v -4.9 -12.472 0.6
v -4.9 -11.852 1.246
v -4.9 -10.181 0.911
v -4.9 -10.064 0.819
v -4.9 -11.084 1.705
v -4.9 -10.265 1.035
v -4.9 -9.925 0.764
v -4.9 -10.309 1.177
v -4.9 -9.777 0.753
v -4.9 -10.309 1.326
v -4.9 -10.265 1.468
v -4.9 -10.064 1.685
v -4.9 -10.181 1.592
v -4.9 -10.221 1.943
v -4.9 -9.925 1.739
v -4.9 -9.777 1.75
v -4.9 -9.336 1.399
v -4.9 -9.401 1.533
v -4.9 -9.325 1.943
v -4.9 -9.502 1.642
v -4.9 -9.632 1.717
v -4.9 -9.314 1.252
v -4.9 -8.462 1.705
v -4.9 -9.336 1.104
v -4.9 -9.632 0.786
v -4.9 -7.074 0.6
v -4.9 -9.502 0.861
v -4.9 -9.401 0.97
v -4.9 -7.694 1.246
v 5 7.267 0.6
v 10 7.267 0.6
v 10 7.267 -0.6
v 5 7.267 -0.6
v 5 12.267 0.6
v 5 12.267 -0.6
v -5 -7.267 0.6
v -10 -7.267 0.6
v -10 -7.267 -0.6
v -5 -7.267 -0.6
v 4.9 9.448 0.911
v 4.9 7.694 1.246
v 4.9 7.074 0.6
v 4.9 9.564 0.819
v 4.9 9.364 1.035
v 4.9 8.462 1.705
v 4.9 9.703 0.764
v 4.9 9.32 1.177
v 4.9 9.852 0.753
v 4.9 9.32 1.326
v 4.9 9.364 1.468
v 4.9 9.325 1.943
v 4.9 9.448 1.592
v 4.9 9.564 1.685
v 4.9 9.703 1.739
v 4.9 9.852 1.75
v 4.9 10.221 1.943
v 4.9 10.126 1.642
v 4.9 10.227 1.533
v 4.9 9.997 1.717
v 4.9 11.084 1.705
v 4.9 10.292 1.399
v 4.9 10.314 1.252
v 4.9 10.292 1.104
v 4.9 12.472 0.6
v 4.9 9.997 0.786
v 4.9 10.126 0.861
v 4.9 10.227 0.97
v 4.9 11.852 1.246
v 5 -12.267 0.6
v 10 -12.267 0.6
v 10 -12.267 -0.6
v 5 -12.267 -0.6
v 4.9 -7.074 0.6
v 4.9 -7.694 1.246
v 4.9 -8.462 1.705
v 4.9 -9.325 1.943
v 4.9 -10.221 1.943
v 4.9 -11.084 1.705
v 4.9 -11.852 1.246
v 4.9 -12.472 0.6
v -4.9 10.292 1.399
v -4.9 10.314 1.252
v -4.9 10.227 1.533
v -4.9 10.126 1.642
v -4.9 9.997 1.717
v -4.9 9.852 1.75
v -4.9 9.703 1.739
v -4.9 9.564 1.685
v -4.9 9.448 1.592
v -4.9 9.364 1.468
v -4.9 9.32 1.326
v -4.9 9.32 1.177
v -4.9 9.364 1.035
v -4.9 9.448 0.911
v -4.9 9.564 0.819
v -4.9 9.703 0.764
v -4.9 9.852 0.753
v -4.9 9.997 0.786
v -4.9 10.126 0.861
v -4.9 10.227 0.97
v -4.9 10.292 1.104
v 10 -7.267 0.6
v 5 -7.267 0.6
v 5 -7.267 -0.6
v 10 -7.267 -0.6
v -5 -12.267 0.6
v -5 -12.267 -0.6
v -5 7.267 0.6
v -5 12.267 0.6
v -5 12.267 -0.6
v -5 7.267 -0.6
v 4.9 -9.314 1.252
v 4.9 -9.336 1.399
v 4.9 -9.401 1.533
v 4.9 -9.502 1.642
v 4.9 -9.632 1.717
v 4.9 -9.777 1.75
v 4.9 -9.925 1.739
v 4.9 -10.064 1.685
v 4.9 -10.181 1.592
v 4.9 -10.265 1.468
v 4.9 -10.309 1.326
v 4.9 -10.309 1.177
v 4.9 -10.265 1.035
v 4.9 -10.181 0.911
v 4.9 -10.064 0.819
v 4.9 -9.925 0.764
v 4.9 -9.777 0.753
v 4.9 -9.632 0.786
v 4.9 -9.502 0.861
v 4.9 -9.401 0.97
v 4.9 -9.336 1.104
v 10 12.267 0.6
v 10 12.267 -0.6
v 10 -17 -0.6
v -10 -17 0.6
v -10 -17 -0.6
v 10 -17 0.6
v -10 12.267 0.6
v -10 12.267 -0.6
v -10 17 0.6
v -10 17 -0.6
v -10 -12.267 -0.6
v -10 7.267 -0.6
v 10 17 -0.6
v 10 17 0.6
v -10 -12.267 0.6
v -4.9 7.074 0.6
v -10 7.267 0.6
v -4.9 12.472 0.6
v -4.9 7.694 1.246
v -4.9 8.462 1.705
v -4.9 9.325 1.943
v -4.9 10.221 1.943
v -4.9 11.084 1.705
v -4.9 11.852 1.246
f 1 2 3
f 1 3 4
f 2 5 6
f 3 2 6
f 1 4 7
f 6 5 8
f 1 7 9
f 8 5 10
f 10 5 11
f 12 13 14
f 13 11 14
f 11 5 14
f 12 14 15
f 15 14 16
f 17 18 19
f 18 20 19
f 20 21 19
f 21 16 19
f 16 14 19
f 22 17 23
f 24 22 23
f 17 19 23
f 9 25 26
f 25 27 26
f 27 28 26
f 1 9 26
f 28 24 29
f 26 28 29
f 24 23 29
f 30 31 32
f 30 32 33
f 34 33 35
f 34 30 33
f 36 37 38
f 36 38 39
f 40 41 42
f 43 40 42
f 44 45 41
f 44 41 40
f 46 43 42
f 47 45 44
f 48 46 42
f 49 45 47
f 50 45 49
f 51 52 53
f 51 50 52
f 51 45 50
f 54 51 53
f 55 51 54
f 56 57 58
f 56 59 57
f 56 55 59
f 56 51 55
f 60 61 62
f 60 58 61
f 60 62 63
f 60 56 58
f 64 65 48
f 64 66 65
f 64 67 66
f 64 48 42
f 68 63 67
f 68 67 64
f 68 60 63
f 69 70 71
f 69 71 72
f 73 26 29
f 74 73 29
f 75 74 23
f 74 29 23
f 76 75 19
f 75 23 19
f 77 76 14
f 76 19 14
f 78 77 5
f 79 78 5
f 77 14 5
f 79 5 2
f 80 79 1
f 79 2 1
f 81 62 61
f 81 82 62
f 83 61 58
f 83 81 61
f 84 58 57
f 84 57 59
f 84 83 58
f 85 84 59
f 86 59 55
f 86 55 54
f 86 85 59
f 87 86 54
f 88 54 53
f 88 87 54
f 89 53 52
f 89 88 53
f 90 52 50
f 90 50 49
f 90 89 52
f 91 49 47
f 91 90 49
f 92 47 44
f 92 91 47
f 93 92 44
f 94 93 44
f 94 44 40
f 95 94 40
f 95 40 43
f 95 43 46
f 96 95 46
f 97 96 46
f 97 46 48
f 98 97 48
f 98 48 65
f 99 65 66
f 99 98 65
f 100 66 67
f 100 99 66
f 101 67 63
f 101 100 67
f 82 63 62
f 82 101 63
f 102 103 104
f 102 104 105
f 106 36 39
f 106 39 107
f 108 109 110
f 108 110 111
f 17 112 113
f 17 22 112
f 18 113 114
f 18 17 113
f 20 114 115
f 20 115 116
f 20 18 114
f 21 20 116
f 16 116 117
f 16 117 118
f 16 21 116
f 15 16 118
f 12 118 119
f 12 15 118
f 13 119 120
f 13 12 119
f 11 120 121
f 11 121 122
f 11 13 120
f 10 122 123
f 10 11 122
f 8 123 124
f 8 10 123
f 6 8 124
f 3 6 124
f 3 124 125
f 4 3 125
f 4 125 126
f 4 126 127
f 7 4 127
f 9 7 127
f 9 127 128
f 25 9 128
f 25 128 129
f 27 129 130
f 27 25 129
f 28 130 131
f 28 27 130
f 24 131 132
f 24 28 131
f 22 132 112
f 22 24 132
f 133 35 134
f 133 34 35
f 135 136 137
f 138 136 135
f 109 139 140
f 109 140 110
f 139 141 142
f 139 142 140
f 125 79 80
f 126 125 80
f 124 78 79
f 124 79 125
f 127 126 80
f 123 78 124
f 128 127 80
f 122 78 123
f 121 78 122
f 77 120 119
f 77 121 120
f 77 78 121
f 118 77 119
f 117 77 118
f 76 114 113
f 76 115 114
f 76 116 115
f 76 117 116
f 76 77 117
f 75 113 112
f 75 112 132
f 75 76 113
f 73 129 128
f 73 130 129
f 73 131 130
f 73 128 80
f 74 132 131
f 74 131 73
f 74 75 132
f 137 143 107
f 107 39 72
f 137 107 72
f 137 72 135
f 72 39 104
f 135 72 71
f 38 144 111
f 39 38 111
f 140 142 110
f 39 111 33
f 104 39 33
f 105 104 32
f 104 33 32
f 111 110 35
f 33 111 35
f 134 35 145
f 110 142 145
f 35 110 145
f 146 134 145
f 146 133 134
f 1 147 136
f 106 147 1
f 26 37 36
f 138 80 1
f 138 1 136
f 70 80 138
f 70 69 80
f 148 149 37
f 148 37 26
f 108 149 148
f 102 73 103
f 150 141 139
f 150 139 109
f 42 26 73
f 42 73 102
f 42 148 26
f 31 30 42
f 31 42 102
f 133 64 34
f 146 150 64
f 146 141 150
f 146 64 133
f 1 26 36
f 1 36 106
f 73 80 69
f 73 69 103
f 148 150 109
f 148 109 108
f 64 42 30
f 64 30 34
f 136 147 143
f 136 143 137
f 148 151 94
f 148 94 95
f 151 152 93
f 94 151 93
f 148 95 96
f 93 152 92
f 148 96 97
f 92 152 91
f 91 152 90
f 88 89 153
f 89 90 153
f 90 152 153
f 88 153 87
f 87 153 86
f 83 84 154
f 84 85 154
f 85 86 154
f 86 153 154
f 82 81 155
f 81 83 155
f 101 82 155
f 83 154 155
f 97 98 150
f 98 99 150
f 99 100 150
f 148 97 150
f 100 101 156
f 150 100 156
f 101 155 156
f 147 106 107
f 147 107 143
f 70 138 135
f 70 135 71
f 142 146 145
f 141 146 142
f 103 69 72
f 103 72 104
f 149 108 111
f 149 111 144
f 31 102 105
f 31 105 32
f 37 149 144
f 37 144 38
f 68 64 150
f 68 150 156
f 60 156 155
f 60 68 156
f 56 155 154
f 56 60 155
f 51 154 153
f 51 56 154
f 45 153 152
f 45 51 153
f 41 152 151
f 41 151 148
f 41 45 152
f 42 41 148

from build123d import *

# Parameters (mm, degrees)
F1_DEPTH = 0.6
F2_R     = 0.5
F3_DEPTH = 4.9


with BuildPart() as f1:
    # F0 (on Top) → F1 (new body, symmetric)
    with BuildSketch(Plane.XY):
        Polygon((10, 12.267178), (10, 17), (-10, 17), (-10, 12.267178), (-5, 12.267178), (-5, 7.267178), (-10, 7.267178), (-10, -7.267178), (-5, -7.267178), (-5, -12.267178), (-10, -12.267178), (-10, -17), (10, -17), (10, -12.267178), (5, -12.267178), (5, -7.267178), (10, -7.267178), (10, 7.267178), (5, 7.267178), (5, 12.267178), align=None)
    extrude(amount=F1_DEPTH, both=True)

    # F2 (on Right) → F3 (join, symmetric)
    with BuildSketch(Plane.YZ):
        with BuildLine():
            Line((-12.487299, 0.57844), (-7.044992, 0.55921))
            ThreePointArc((-7.044992, 0.55921), (-9.761185, 1.972687), (-12.487299, 0.57844))
        make_face()
        with Locations((-9.814223, 1.251517)):
            Circle(F2_R, mode=Mode.SUBTRACT)
        with BuildLine():
            ThreePointArc((12.487299, 0.57844), (9.761185, 1.972687), (7.044992, 0.55921))
            Line((7.044992, 0.55921), (12.487299, 0.57844))
        make_face()
        with Locations((9.814223, 1.251517)):
            Circle(F2_R, mode=Mode.SUBTRACT)
    extrude(amount=F3_DEPTH, both=True)


solid = f1.part
